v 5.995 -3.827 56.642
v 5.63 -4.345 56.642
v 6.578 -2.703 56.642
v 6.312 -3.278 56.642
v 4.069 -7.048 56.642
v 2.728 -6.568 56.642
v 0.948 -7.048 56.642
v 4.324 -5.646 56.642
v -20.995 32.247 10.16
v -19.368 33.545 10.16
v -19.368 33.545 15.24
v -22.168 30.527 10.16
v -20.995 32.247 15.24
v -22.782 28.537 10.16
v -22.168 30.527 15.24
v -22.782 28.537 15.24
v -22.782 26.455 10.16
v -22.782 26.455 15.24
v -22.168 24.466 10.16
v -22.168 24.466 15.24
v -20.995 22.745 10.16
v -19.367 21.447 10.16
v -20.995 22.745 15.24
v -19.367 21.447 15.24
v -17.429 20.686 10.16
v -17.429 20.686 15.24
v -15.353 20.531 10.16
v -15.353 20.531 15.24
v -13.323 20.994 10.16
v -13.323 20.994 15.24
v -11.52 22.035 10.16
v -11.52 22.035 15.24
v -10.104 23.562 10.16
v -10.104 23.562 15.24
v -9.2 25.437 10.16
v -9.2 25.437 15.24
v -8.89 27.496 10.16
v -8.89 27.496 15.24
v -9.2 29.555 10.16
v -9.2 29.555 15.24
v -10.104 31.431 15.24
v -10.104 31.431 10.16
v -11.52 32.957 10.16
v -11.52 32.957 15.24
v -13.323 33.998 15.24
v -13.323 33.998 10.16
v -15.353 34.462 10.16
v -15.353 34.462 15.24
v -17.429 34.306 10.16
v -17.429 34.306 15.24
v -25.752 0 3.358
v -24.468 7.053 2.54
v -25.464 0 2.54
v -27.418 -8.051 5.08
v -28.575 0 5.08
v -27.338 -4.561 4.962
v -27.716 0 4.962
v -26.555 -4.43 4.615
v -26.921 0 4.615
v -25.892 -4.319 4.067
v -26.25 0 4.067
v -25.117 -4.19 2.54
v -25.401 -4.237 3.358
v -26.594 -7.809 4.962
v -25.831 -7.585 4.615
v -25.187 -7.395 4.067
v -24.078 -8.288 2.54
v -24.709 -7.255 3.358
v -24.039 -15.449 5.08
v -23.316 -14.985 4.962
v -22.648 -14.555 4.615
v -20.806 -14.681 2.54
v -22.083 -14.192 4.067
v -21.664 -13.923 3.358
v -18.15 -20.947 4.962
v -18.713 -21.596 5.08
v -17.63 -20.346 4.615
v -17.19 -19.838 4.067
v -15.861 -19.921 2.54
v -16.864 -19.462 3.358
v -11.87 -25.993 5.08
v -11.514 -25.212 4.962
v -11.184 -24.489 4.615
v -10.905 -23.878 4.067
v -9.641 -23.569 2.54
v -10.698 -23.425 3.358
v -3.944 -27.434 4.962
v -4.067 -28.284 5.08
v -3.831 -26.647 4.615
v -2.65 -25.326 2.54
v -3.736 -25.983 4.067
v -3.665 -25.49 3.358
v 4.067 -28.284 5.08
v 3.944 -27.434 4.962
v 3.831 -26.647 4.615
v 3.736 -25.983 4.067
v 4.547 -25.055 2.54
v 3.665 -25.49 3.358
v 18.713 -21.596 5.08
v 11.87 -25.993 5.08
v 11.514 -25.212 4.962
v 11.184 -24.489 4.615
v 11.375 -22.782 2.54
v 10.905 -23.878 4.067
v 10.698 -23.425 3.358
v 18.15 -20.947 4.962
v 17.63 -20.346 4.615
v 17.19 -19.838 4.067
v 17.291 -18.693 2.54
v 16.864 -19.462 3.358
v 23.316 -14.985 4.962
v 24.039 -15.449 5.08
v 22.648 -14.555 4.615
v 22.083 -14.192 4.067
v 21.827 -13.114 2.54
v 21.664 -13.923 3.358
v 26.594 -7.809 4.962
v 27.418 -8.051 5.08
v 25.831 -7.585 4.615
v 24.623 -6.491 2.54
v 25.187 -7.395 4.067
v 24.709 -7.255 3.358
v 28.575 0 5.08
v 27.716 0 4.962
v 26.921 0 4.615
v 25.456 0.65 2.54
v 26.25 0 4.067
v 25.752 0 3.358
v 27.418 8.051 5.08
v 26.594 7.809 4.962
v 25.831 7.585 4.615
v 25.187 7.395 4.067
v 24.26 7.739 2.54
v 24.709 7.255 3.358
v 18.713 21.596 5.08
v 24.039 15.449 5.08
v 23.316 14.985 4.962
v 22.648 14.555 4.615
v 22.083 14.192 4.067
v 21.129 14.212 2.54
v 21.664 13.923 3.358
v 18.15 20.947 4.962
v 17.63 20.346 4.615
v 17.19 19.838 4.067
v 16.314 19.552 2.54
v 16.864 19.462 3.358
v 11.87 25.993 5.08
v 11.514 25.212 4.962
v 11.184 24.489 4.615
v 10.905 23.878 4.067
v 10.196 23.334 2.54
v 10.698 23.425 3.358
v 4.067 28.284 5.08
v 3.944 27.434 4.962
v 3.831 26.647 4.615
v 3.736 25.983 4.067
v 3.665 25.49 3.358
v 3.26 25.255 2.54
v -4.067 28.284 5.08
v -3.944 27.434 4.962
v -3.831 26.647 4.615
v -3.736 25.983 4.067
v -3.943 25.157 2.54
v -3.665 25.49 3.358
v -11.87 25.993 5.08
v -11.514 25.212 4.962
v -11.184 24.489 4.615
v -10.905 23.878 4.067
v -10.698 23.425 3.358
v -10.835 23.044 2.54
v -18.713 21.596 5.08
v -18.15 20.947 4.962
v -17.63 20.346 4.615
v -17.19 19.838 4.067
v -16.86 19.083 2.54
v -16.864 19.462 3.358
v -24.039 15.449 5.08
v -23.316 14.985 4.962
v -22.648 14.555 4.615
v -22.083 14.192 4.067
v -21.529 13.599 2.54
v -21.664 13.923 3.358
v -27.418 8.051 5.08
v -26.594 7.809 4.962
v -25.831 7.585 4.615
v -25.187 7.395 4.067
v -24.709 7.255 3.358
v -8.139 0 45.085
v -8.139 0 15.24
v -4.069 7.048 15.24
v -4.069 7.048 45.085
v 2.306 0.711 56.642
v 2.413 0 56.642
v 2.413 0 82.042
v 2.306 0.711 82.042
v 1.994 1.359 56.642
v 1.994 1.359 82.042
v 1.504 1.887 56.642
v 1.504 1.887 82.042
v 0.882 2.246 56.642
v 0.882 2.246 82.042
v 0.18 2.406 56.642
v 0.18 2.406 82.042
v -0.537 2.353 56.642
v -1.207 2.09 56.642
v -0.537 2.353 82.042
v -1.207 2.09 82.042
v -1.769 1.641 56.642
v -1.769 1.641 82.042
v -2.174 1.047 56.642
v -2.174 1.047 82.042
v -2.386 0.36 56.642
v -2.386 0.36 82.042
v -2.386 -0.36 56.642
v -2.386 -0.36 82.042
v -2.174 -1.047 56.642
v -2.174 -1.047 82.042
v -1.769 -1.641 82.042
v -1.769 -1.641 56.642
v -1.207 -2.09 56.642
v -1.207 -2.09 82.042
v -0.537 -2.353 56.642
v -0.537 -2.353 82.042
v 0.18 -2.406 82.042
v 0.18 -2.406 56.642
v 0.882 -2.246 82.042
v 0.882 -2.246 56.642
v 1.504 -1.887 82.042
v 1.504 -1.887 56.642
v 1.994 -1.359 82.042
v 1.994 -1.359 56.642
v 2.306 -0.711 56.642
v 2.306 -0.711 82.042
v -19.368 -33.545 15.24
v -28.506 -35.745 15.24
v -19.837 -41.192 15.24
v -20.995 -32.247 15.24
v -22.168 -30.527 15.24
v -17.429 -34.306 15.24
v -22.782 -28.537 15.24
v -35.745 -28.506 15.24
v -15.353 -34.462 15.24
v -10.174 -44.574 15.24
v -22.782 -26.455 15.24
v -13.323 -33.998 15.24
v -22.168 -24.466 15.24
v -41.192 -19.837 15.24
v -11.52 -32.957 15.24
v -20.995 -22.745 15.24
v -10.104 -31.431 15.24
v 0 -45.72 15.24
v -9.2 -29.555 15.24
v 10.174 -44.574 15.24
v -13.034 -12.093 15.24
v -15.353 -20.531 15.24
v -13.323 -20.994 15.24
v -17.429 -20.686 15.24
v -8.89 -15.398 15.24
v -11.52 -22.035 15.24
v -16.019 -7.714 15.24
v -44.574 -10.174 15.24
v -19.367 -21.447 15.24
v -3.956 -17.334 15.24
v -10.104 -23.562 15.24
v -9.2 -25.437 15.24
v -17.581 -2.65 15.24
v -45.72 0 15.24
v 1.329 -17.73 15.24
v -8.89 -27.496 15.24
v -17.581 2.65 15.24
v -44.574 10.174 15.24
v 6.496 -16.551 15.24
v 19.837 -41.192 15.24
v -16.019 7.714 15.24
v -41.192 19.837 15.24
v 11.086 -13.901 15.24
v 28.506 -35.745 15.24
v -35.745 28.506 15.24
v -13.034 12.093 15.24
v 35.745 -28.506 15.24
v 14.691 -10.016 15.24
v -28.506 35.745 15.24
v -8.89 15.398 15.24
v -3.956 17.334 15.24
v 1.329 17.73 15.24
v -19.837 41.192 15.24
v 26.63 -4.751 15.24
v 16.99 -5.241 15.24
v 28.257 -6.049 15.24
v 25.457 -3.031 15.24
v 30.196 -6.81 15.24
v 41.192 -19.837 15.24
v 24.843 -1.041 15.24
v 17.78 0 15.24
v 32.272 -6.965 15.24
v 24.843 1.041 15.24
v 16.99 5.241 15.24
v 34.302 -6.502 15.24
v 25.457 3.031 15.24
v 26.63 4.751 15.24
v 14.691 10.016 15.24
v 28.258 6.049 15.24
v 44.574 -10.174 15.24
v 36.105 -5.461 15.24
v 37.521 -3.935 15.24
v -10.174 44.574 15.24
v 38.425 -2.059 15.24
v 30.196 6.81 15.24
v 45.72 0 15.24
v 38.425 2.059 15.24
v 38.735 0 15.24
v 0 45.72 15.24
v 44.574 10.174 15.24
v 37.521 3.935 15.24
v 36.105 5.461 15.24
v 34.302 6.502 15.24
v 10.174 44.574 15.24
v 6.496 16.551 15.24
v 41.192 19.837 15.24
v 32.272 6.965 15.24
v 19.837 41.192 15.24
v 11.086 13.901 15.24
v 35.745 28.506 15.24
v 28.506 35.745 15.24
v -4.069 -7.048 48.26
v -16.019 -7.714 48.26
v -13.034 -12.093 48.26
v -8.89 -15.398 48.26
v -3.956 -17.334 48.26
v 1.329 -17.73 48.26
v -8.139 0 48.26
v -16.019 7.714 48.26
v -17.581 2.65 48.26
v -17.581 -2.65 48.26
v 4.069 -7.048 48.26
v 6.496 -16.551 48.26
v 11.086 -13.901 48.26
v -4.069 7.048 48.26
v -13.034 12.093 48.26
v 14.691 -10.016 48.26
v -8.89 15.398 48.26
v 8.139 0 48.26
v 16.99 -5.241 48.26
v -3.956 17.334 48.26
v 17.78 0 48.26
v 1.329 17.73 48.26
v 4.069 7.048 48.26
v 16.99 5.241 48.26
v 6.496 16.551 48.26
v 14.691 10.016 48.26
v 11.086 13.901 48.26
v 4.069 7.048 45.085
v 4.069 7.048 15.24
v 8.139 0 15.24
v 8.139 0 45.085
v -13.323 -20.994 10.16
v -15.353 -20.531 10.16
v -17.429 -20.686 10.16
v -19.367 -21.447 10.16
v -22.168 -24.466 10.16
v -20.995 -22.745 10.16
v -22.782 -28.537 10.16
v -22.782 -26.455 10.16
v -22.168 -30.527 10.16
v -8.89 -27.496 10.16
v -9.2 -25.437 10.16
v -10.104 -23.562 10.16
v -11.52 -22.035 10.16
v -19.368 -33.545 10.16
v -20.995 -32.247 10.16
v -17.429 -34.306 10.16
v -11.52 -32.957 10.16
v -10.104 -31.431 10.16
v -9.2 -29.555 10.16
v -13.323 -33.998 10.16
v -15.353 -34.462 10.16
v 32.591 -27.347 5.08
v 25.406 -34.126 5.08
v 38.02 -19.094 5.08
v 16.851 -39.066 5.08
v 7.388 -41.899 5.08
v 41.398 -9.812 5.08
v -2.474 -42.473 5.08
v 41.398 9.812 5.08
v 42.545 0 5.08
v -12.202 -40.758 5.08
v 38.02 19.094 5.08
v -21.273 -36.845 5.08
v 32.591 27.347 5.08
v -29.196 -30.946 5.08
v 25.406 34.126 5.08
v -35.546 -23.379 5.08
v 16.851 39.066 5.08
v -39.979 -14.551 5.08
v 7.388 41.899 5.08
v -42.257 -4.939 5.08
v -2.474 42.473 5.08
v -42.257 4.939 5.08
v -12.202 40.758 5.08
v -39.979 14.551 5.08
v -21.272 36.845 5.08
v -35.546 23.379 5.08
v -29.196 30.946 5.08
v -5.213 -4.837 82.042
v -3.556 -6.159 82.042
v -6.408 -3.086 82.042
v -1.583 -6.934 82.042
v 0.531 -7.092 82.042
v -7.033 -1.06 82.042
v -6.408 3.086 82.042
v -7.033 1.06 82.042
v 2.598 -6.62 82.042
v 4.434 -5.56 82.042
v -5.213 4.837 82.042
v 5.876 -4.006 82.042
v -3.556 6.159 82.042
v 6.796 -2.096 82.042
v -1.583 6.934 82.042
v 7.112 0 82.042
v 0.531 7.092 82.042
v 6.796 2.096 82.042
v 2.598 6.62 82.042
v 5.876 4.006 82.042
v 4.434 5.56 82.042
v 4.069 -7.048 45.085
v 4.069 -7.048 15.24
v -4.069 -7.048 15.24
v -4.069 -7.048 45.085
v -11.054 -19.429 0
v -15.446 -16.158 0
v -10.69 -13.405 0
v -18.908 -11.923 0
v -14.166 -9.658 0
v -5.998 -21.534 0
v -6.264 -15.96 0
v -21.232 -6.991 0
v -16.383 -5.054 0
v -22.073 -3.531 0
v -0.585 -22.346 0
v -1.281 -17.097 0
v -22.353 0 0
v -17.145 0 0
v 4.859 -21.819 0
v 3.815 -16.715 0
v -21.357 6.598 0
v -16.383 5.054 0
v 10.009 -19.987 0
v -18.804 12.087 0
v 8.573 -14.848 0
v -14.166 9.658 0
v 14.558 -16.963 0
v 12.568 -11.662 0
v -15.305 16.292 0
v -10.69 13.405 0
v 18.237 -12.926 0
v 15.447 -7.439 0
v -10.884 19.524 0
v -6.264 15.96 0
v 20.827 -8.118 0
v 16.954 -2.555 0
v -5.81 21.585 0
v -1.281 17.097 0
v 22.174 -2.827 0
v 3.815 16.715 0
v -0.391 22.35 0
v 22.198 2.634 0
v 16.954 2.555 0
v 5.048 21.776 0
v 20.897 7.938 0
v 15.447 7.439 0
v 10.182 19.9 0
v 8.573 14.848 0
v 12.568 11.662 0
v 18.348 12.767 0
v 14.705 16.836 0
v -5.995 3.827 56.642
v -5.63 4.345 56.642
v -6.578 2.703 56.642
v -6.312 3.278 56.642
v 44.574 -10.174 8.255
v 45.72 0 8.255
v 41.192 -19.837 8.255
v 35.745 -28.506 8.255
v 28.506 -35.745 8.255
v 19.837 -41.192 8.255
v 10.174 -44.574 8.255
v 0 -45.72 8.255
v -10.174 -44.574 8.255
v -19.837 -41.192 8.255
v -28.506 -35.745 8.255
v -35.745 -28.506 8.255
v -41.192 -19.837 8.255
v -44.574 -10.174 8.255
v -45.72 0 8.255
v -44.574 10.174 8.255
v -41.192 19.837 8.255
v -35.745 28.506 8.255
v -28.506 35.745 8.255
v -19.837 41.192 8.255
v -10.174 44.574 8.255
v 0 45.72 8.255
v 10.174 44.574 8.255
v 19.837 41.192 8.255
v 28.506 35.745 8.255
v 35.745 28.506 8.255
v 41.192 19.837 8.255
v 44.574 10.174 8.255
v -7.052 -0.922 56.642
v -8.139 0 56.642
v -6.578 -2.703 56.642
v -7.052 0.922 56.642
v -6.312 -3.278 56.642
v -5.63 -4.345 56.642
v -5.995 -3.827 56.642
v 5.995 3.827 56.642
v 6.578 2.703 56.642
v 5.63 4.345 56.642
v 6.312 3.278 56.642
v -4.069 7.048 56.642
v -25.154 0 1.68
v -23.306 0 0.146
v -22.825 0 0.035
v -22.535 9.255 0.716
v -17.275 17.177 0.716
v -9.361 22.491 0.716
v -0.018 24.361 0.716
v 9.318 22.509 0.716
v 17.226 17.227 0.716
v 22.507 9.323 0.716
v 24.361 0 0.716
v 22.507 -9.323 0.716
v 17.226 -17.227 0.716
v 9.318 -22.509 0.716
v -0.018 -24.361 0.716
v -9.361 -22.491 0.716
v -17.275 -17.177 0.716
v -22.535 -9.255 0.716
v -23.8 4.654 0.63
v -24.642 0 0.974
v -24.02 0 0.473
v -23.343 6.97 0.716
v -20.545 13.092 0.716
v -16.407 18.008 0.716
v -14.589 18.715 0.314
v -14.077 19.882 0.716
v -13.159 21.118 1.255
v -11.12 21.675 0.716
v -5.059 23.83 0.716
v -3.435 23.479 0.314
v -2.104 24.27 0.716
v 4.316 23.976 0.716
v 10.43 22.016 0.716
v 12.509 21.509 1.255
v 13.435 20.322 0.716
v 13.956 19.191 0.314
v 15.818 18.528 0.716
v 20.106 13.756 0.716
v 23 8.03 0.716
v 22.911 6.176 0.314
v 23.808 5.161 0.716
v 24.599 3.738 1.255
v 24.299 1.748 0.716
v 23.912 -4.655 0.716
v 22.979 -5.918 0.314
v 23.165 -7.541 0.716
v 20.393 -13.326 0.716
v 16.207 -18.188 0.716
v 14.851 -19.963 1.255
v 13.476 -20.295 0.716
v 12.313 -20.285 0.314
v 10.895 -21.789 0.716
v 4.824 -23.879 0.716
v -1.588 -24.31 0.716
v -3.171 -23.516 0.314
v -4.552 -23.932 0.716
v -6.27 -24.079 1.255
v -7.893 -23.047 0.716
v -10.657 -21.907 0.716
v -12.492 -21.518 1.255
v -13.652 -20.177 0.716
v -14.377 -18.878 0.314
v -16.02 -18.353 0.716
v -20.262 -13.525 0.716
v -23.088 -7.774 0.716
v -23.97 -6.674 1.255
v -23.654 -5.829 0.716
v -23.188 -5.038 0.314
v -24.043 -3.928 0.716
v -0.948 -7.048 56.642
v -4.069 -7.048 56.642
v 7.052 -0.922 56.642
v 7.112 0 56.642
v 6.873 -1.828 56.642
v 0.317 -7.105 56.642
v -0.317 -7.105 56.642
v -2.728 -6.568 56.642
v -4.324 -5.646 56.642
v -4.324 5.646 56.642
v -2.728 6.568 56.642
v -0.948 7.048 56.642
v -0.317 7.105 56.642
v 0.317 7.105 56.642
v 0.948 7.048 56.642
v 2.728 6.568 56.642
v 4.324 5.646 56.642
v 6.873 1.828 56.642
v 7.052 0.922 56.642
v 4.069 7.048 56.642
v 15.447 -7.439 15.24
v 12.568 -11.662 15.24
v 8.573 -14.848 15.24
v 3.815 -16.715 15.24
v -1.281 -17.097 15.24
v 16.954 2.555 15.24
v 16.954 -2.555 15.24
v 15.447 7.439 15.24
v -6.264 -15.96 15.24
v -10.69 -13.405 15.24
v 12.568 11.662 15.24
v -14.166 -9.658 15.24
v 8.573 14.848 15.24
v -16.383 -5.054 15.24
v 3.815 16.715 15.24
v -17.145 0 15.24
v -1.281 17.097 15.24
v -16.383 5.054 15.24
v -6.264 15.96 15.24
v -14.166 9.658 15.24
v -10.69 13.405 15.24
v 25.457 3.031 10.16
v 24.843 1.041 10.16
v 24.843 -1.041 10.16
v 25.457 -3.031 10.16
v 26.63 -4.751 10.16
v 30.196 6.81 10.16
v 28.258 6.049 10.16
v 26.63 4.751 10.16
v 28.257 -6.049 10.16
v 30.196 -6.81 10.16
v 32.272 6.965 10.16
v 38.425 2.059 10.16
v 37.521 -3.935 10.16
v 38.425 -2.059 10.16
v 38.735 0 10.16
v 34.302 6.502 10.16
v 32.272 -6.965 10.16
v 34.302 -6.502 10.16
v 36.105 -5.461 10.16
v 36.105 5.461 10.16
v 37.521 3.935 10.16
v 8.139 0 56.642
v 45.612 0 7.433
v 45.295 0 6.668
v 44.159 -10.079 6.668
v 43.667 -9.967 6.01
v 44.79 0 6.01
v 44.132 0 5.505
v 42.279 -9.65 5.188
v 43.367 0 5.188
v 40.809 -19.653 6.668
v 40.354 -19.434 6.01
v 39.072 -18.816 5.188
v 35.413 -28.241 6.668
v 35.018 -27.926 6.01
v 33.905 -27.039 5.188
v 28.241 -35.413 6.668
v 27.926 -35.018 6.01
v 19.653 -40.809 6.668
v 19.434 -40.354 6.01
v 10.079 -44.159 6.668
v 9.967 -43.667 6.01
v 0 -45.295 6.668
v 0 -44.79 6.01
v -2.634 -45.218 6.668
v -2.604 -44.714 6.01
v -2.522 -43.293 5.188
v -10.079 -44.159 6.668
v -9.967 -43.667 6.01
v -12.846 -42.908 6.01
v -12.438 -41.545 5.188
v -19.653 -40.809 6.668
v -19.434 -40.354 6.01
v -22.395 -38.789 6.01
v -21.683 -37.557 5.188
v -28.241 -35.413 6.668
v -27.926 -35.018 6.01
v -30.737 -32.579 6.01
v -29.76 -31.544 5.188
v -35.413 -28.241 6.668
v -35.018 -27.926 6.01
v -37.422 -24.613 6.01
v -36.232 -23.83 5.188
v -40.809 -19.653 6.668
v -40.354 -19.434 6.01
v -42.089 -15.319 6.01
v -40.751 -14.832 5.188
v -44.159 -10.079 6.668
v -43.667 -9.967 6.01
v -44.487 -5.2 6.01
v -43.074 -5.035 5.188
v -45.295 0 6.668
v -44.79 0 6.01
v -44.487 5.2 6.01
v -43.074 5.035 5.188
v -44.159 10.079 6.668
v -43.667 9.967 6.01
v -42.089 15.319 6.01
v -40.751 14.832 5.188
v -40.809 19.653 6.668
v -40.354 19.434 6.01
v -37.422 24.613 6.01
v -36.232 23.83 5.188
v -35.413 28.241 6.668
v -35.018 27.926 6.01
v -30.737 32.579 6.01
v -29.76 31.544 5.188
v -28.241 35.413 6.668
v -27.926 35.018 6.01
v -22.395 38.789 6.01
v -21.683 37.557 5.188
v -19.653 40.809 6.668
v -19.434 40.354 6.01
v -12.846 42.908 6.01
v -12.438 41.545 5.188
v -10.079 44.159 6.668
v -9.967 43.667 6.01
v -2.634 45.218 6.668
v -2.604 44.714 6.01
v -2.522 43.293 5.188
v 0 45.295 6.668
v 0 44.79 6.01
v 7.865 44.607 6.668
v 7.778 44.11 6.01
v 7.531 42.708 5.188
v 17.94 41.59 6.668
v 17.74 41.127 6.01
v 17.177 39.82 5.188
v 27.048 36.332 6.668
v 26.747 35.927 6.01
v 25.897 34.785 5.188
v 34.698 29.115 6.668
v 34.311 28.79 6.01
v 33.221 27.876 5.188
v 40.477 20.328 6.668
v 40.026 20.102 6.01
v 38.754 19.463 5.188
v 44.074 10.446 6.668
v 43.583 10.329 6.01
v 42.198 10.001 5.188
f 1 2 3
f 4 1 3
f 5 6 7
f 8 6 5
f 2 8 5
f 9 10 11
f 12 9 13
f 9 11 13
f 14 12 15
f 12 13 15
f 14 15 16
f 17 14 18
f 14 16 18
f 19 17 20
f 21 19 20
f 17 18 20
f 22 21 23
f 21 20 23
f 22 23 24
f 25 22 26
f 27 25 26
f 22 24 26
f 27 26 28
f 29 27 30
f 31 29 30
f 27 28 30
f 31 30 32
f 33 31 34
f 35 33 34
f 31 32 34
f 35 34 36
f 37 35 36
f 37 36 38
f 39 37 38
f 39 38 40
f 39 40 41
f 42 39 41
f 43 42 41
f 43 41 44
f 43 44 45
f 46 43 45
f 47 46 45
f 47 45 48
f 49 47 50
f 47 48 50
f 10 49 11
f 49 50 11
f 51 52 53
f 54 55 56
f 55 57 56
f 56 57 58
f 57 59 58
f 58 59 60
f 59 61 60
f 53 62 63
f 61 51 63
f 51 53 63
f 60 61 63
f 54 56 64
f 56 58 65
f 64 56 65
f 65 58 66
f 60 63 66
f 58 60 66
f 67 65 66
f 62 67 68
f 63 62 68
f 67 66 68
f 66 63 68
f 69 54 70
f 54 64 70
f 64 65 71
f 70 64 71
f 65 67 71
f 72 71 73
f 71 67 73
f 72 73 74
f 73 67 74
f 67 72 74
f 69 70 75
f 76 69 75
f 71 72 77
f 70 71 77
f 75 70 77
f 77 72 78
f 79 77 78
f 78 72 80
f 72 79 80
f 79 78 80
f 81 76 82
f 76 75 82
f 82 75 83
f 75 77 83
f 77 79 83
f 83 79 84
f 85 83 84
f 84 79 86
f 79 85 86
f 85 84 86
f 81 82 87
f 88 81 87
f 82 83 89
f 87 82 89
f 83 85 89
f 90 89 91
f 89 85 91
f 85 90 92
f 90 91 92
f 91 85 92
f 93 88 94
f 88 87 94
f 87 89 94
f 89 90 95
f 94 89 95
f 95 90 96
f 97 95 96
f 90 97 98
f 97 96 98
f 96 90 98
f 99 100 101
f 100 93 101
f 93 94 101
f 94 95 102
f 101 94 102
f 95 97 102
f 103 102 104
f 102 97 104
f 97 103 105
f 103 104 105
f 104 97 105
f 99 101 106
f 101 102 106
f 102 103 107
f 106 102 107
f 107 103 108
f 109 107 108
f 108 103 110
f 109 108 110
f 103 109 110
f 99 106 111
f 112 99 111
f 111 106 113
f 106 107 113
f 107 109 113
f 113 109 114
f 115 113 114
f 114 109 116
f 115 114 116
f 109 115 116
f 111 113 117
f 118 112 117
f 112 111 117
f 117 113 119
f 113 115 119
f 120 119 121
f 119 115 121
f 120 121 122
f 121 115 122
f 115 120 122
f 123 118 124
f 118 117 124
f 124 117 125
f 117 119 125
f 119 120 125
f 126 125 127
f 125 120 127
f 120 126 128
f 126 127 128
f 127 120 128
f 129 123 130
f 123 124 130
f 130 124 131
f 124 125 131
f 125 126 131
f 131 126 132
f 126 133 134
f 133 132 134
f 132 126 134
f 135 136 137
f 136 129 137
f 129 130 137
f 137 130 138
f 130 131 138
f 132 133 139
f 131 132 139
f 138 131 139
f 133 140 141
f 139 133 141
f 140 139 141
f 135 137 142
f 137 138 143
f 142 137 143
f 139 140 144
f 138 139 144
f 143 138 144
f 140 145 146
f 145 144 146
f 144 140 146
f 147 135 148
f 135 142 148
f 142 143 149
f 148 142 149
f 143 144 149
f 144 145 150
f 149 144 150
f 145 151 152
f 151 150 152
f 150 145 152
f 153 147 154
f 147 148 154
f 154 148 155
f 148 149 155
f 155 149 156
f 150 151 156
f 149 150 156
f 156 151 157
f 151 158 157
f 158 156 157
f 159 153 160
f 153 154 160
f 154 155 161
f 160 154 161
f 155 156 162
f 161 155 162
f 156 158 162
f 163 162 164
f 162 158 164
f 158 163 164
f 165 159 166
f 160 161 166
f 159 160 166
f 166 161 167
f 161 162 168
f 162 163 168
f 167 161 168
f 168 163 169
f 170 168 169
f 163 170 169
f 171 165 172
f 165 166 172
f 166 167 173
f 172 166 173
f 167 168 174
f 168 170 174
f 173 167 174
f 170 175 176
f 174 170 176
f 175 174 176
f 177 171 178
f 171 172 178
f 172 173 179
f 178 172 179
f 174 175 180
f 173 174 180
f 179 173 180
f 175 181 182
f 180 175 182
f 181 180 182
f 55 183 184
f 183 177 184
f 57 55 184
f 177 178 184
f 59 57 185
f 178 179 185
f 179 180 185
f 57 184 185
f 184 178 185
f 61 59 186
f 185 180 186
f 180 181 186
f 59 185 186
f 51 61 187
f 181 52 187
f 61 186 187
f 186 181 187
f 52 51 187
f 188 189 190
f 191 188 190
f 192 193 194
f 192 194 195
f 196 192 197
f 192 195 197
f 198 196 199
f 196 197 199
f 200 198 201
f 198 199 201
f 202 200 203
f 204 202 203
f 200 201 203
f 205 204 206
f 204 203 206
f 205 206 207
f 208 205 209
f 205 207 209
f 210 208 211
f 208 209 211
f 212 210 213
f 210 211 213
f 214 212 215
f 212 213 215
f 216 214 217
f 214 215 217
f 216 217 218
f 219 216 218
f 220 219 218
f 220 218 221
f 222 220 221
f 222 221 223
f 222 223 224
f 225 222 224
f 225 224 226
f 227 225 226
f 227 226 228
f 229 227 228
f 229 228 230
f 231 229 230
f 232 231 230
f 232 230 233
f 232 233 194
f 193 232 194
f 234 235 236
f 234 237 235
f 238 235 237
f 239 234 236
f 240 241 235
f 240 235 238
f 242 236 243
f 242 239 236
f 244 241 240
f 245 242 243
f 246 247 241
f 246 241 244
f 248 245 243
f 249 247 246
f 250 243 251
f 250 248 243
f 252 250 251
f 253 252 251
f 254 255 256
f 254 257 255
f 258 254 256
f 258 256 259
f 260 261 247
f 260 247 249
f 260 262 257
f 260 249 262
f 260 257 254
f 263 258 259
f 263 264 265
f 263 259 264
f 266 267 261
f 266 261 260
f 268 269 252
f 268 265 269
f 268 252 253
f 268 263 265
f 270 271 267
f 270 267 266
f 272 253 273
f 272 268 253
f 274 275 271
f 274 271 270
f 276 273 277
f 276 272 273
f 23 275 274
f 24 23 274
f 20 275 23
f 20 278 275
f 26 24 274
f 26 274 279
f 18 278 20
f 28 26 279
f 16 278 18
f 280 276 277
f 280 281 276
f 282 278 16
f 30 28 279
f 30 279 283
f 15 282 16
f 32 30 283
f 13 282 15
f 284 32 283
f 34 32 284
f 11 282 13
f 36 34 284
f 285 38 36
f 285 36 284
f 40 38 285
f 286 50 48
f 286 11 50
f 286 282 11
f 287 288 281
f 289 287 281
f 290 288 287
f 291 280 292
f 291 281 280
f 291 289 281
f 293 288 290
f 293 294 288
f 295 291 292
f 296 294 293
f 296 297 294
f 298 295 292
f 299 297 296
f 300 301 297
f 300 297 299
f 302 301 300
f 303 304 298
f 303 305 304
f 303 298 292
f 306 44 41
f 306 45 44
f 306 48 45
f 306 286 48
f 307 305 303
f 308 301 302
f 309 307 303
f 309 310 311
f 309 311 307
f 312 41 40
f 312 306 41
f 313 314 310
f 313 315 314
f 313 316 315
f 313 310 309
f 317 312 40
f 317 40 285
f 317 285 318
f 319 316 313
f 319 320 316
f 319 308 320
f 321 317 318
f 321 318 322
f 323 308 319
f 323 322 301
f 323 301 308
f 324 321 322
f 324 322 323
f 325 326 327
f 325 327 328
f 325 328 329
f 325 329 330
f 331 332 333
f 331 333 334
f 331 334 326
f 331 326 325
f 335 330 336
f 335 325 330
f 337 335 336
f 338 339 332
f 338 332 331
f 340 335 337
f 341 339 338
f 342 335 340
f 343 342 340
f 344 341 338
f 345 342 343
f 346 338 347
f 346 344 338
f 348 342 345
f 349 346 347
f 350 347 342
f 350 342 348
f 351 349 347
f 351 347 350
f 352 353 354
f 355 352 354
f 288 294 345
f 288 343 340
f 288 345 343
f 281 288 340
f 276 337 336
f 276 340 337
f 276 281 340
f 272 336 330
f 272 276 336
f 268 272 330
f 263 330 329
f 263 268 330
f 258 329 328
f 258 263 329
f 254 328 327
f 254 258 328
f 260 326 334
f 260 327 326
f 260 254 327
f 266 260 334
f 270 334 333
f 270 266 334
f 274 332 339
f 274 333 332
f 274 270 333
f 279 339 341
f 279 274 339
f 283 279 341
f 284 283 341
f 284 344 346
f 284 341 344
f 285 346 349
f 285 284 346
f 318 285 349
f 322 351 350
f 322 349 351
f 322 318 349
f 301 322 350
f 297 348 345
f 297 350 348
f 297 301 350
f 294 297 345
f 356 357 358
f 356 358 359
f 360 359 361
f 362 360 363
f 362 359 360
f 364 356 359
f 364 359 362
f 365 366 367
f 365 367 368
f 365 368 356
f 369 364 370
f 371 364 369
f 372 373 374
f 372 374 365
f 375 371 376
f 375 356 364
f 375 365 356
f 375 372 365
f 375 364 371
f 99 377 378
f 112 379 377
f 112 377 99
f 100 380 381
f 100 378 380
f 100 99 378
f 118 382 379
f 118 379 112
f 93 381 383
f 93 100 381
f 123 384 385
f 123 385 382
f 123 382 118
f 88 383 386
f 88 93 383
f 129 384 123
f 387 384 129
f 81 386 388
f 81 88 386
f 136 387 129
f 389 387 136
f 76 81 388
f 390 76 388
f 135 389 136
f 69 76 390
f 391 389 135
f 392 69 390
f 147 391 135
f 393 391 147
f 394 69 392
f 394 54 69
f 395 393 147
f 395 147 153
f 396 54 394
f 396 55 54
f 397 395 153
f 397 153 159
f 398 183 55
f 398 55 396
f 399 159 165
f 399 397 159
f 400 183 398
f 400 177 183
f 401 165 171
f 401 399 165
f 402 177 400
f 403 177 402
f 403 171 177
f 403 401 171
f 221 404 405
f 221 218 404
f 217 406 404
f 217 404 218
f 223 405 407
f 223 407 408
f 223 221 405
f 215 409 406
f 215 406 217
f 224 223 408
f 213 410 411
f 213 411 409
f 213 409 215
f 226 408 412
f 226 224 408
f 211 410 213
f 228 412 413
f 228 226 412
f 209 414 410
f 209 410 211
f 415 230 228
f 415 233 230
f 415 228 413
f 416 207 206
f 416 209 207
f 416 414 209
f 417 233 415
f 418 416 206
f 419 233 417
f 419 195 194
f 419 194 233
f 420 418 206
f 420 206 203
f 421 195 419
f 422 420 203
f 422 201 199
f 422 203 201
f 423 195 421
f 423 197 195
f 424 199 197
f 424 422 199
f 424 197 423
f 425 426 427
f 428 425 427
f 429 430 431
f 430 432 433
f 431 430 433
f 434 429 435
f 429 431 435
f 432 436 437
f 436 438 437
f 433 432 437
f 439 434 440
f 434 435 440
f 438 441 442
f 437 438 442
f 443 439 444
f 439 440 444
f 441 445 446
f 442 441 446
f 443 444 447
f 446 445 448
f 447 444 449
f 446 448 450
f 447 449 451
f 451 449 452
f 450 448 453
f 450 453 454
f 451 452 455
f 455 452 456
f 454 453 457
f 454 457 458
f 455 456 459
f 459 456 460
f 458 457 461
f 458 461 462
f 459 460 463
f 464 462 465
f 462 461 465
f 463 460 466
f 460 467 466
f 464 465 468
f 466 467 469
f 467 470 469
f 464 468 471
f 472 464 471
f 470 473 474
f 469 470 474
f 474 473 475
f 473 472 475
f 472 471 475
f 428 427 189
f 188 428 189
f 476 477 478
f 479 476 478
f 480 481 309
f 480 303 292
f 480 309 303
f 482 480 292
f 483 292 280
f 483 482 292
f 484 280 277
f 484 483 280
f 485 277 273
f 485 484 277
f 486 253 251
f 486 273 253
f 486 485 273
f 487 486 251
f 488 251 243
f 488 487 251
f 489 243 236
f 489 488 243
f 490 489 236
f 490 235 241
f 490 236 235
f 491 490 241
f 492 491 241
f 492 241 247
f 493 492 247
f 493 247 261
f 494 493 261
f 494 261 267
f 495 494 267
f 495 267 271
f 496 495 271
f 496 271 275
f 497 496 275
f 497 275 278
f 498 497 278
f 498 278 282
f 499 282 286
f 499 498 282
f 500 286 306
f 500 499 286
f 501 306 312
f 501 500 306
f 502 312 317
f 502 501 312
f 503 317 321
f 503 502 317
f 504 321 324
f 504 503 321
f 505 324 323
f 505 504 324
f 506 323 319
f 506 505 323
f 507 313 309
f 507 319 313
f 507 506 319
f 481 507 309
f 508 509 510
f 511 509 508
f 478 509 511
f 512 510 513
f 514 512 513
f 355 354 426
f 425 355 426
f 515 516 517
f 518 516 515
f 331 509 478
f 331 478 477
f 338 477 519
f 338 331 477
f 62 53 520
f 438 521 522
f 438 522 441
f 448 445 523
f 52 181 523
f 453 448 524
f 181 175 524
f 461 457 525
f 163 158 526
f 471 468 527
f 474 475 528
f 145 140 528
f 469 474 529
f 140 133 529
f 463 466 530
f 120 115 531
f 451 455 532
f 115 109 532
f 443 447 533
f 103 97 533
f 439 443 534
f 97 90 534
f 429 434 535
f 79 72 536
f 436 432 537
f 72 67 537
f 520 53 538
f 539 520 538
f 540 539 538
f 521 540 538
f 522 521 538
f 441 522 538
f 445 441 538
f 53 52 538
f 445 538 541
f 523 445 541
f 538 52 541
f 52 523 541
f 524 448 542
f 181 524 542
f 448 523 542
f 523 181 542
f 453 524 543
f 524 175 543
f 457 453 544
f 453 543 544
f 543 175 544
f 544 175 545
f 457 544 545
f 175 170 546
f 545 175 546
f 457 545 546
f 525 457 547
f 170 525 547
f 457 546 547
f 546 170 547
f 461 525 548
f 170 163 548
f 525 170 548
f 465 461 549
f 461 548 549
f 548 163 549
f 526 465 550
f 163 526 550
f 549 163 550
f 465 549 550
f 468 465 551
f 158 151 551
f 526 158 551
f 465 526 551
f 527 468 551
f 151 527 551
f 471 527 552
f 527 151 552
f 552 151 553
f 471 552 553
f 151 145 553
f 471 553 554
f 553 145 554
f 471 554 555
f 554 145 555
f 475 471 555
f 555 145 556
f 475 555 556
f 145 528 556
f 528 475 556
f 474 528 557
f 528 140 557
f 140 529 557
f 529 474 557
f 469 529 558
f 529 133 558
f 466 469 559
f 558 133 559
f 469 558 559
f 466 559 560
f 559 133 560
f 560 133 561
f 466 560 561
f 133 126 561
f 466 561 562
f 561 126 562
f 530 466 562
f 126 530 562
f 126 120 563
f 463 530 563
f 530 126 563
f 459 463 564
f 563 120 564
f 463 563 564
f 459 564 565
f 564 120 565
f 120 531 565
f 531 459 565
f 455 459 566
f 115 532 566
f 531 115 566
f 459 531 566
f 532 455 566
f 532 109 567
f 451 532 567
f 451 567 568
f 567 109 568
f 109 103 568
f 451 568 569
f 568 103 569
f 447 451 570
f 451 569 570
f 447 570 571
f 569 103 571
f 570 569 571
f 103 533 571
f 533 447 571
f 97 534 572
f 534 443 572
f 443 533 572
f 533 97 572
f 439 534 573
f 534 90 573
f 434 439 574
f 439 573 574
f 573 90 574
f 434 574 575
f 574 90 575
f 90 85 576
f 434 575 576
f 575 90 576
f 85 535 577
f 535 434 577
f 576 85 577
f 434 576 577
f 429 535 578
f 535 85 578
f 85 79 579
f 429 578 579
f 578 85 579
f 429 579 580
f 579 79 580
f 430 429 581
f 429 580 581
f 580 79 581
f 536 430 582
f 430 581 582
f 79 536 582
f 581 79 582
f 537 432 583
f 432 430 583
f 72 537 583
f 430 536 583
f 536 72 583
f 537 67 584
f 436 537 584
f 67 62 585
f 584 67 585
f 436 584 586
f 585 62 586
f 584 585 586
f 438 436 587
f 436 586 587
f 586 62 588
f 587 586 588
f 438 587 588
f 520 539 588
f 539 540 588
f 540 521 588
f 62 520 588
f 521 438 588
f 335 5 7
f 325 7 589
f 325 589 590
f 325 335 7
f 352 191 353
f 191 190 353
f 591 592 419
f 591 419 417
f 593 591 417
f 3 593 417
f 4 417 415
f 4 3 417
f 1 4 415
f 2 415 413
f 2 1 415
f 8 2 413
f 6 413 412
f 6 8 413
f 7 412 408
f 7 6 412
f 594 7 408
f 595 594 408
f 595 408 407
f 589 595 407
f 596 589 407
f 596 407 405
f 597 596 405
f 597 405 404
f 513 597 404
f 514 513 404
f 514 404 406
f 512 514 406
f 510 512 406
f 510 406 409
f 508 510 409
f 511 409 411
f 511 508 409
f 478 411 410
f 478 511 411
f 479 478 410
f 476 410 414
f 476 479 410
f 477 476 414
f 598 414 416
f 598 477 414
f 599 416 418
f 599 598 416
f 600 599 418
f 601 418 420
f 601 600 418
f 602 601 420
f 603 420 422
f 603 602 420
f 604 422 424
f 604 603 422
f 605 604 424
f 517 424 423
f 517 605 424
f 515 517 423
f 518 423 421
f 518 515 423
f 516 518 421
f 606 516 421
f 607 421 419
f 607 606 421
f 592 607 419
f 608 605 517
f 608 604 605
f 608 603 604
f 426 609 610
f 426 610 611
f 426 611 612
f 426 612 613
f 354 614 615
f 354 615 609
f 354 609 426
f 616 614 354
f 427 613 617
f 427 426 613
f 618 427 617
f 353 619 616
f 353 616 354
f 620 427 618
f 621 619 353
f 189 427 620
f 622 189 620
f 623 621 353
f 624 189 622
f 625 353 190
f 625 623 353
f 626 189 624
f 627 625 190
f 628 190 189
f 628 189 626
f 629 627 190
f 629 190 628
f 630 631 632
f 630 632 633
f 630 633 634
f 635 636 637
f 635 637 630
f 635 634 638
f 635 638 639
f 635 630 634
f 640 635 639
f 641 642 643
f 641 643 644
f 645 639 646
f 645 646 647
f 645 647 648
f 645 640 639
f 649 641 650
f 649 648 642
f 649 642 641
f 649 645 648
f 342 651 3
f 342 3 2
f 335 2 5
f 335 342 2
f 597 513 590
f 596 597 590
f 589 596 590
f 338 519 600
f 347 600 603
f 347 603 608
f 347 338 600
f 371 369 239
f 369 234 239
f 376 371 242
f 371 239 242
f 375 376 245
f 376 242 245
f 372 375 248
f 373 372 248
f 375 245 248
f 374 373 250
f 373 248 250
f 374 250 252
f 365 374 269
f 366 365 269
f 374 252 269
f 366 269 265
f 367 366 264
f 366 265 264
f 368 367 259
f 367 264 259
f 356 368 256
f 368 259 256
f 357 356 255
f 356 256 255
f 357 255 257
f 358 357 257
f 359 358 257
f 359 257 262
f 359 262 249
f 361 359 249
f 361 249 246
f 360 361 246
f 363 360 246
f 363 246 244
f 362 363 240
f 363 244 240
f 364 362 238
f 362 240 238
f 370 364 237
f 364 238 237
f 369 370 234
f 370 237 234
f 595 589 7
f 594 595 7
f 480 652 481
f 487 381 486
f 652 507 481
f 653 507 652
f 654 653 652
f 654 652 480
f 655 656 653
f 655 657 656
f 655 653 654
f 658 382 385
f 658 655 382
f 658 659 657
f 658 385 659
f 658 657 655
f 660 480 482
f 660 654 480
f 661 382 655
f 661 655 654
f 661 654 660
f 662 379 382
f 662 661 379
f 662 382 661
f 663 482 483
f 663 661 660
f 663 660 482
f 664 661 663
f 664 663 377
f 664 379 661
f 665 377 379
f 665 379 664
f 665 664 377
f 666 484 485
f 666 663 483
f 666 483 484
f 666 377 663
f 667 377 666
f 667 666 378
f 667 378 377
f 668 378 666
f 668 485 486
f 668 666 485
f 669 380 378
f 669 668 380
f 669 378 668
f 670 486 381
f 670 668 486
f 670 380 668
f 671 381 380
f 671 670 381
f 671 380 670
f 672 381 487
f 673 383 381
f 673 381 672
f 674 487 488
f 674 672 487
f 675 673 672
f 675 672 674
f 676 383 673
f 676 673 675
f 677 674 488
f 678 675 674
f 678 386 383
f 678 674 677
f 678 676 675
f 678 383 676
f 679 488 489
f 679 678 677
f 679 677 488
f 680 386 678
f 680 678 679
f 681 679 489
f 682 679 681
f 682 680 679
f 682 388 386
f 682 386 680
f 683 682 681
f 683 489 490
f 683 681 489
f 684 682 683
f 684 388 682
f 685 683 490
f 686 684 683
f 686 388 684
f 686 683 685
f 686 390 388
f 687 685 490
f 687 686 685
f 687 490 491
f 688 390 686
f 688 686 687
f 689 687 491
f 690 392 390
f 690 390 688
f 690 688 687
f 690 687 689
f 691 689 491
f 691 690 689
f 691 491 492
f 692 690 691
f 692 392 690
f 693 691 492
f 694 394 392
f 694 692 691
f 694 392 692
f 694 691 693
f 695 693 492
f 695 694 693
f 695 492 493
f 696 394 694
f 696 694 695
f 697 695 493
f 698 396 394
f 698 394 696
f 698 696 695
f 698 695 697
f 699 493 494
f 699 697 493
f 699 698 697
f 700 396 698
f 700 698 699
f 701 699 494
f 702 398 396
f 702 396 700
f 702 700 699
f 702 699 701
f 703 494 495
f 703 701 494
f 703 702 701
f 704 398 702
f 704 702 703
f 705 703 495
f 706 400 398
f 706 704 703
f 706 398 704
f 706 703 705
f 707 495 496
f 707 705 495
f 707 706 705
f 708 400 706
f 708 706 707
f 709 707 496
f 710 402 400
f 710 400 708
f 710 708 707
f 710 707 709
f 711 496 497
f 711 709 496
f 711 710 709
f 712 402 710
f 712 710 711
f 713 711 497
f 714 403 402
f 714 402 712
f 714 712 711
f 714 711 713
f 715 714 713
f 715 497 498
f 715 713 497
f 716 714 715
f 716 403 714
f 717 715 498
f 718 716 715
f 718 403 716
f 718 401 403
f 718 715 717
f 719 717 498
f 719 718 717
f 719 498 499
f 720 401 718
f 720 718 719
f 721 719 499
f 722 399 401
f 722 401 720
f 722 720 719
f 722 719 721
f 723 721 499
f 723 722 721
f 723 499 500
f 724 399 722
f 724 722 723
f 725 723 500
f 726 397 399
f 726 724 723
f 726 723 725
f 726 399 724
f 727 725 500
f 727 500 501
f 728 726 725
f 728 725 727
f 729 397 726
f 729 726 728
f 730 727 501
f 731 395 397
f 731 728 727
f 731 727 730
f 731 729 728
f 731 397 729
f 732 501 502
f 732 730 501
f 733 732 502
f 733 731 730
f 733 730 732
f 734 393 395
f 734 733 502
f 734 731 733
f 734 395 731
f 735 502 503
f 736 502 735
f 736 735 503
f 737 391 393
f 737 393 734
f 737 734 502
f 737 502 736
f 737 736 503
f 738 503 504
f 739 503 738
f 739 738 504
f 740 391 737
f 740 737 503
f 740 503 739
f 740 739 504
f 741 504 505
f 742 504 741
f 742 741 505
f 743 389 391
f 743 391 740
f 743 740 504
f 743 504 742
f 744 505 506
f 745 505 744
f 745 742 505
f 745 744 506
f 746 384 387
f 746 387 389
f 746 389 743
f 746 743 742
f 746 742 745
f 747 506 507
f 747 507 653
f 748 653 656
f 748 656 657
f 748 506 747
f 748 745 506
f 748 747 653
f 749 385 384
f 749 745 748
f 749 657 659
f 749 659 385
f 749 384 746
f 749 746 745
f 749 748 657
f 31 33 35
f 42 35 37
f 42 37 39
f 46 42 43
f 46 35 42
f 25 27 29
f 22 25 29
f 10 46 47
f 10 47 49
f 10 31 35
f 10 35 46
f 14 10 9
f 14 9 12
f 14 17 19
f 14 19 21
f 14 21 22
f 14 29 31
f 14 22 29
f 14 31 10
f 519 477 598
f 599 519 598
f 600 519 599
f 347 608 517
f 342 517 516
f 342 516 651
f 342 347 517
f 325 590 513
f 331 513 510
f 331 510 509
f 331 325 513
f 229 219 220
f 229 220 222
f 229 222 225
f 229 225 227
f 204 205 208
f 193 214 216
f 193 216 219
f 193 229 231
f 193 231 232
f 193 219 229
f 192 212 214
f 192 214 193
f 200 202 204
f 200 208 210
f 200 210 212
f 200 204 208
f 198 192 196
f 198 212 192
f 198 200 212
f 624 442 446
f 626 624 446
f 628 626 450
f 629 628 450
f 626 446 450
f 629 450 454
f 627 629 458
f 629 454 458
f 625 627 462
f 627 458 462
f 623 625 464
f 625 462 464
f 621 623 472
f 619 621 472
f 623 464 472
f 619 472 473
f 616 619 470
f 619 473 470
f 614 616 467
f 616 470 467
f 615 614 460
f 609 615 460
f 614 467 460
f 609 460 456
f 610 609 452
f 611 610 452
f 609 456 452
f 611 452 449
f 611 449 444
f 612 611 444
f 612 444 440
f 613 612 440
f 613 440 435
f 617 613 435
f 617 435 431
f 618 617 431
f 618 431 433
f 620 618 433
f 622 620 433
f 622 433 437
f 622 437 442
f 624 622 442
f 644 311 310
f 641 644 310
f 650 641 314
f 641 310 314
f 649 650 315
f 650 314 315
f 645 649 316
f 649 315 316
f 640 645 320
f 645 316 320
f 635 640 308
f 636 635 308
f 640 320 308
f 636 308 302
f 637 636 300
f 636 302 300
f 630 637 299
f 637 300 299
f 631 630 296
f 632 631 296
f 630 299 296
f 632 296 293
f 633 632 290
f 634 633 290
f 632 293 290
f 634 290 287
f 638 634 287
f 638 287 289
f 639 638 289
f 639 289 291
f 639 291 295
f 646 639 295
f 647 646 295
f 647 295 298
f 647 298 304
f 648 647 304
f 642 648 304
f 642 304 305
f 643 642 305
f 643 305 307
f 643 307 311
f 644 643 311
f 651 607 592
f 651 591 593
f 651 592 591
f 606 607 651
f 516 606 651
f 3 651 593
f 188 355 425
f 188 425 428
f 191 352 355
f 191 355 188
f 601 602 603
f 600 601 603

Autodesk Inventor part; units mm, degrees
ref_plane "YZ Plane" through (0, 0, 0) normal (1, 0, 0) x (0, 1, 0)
ref_plane "XZ Plane" through (0, 0, 0) normal (0, 1, 0) x (-1, 0, 0)
ref_plane "XY Plane" through (0, 0, 0) normal (0, 0, 1) x (1, 0, 0)
sketch "Sketch1" plane through (0, 0, 0) normal (0, 0, 1) x (1, 0, 0)
  circle A0 centre (0, 0) radius 45.72
  dimension "d0" = 91.44
extrude "Extrusion1" add sketch "Sketch1" along normal blind 15.24
sketch "Sketch2" plane through (0, 0, 15.24) normal (0, 0, 1) x (1, 0, 0)
  circle A0 centre (0, 0) radius 17.78
  dimension "d3" = 35.56
extrude "Extrusion2" add sketch "Sketch2" along normal blind 33.02
sketch "Sketch3" plane through (0, 0, 48.26) normal (0, 0, 1) x (1, 0, 0)
  line L0 (4.0695, 7.0485) -> (8.1389, 0)
  line L1 (8.1389, 0) -> (4.0695, -7.0485)
  line L2 (4.0695, -7.0485) -> (-4.0695, -7.0485)
  line L3 (-4.0695, -7.0485) -> (-8.1389, 0)
  line L4 (-8.1389, 0) -> (-4.0695, 7.0485)
  line L5 (-4.0695, 7.0485) -> (4.0695, 7.0485)
  point P0 (0, 0)
  point P1 (0, 0)
  dimension "d6" = 14.097
extrude "Extrusion3" add sketch "Sketch3" along normal blind 8.382
sketch "Sketch4" plane through (0, 0, 56.642) normal (0, 0, 1) x (1, 0, 0)
  circle A0 centre (0, 0) radius 7.112
  dimension "d9" = 14.224
extrude "Extrusion4" add sketch "Sketch4" along normal blind 25.4
sketch "Sketch5" plane through (0, 0, 82.042) normal (0, 0, 1) x (1, 0, 0)
  circle A0 centre (0, 0) radius 2.413
  dimension "d12" = 4.826
extrude "Extrusion5" cut sketch "Sketch5" against normal up to surface (25.4 mm away)
sketch "Sketch6" plane through (0, 0, 0) normal (0, 0, -1) x (-1, 0, 0)
  circle A0 centre (0, 0) radius 45.72 projected
  circle A1 centre (0, 0) radius 25.4
  dimension "d15" = 50.8
extrude "Extrusion6" cut sketch "Sketch6" against normal blind 5.08
sketch "Sketch7" plane through (0, 0, 0) normal (0, 0, -1) x (-1, 0, 0)
  circle A0 centre (0, 0) radius 17.145
  dimension "d19" = 34.29
extrude "Extrusion7" cut sketch "Sketch7" against normal blind 15.24
fillet "Fillet1" radius 3.175 3 edges at (-45.72, 0, 5.08) (25.4, 0, 5.08) (25.4, 0, 0)
sketch "Sketch8" plane through (0, 0, 15.24) normal (0, 0, -1) x (-1, 0, 0)
  line L0 (8.1389, 0) -> (4.0695, 7.0485) projected
  line L1 (4.0695, -7.0485) -> (8.1389, 0) projected
  line L2 (-4.0695, -7.0485) -> (4.0695, -7.0485) projected
  line L3 (-8.1389, 0) -> (-4.0695, -7.0485) projected
  line L4 (-4.0695, 7.0485) -> (-8.1389, 0) projected
  line L5 (4.0695, 7.0485) -> (-4.0695, 7.0485) projected
  line L6 (4.0695, 7.0485) -> (8.1389, 0)
  line L7 (8.1389, 0) -> (4.0695, -7.0485)
  line L8 (4.0695, -7.0485) -> (-4.0695, -7.0485)
  line L9 (-4.0695, -7.0485) -> (-8.1389, 0)
  line L10 (-8.1389, 0) -> (-4.0695, 7.0485)
  line L11 (-4.0695, 7.0485) -> (4.0695, 7.0485)
  point P0 (0, 0)
  point P1 (0, 0)
extrude "Extrusion8" cut sketch "Sketch8" against normal blind 29.845
sketch "Sketch9" plane through (0, 0, 15.24) normal (0, 0, 1) x (1, 0, 0)
  circle A0 centre (31.75, 0) radius 6.985
  circle A1 centre (0, 0) radius 45.72 projected
  line L0 (31.75, 0) -> (45.72, 0) construction
  line L1 (0, 0) -> (31.75, 0) construction
  dimension "d24" = 13.97
  dimension "d25" = 13.97
extrude "Extrusion9" cut sketch "Sketch9" against normal blind 5.08 contours A0
pattern_circular "Circular Pattern1" count 3 over 360 about axis through (0, 0, 15.24) along (0, 0, 1) of "Extrusion9"
properties part number "Cutter"
